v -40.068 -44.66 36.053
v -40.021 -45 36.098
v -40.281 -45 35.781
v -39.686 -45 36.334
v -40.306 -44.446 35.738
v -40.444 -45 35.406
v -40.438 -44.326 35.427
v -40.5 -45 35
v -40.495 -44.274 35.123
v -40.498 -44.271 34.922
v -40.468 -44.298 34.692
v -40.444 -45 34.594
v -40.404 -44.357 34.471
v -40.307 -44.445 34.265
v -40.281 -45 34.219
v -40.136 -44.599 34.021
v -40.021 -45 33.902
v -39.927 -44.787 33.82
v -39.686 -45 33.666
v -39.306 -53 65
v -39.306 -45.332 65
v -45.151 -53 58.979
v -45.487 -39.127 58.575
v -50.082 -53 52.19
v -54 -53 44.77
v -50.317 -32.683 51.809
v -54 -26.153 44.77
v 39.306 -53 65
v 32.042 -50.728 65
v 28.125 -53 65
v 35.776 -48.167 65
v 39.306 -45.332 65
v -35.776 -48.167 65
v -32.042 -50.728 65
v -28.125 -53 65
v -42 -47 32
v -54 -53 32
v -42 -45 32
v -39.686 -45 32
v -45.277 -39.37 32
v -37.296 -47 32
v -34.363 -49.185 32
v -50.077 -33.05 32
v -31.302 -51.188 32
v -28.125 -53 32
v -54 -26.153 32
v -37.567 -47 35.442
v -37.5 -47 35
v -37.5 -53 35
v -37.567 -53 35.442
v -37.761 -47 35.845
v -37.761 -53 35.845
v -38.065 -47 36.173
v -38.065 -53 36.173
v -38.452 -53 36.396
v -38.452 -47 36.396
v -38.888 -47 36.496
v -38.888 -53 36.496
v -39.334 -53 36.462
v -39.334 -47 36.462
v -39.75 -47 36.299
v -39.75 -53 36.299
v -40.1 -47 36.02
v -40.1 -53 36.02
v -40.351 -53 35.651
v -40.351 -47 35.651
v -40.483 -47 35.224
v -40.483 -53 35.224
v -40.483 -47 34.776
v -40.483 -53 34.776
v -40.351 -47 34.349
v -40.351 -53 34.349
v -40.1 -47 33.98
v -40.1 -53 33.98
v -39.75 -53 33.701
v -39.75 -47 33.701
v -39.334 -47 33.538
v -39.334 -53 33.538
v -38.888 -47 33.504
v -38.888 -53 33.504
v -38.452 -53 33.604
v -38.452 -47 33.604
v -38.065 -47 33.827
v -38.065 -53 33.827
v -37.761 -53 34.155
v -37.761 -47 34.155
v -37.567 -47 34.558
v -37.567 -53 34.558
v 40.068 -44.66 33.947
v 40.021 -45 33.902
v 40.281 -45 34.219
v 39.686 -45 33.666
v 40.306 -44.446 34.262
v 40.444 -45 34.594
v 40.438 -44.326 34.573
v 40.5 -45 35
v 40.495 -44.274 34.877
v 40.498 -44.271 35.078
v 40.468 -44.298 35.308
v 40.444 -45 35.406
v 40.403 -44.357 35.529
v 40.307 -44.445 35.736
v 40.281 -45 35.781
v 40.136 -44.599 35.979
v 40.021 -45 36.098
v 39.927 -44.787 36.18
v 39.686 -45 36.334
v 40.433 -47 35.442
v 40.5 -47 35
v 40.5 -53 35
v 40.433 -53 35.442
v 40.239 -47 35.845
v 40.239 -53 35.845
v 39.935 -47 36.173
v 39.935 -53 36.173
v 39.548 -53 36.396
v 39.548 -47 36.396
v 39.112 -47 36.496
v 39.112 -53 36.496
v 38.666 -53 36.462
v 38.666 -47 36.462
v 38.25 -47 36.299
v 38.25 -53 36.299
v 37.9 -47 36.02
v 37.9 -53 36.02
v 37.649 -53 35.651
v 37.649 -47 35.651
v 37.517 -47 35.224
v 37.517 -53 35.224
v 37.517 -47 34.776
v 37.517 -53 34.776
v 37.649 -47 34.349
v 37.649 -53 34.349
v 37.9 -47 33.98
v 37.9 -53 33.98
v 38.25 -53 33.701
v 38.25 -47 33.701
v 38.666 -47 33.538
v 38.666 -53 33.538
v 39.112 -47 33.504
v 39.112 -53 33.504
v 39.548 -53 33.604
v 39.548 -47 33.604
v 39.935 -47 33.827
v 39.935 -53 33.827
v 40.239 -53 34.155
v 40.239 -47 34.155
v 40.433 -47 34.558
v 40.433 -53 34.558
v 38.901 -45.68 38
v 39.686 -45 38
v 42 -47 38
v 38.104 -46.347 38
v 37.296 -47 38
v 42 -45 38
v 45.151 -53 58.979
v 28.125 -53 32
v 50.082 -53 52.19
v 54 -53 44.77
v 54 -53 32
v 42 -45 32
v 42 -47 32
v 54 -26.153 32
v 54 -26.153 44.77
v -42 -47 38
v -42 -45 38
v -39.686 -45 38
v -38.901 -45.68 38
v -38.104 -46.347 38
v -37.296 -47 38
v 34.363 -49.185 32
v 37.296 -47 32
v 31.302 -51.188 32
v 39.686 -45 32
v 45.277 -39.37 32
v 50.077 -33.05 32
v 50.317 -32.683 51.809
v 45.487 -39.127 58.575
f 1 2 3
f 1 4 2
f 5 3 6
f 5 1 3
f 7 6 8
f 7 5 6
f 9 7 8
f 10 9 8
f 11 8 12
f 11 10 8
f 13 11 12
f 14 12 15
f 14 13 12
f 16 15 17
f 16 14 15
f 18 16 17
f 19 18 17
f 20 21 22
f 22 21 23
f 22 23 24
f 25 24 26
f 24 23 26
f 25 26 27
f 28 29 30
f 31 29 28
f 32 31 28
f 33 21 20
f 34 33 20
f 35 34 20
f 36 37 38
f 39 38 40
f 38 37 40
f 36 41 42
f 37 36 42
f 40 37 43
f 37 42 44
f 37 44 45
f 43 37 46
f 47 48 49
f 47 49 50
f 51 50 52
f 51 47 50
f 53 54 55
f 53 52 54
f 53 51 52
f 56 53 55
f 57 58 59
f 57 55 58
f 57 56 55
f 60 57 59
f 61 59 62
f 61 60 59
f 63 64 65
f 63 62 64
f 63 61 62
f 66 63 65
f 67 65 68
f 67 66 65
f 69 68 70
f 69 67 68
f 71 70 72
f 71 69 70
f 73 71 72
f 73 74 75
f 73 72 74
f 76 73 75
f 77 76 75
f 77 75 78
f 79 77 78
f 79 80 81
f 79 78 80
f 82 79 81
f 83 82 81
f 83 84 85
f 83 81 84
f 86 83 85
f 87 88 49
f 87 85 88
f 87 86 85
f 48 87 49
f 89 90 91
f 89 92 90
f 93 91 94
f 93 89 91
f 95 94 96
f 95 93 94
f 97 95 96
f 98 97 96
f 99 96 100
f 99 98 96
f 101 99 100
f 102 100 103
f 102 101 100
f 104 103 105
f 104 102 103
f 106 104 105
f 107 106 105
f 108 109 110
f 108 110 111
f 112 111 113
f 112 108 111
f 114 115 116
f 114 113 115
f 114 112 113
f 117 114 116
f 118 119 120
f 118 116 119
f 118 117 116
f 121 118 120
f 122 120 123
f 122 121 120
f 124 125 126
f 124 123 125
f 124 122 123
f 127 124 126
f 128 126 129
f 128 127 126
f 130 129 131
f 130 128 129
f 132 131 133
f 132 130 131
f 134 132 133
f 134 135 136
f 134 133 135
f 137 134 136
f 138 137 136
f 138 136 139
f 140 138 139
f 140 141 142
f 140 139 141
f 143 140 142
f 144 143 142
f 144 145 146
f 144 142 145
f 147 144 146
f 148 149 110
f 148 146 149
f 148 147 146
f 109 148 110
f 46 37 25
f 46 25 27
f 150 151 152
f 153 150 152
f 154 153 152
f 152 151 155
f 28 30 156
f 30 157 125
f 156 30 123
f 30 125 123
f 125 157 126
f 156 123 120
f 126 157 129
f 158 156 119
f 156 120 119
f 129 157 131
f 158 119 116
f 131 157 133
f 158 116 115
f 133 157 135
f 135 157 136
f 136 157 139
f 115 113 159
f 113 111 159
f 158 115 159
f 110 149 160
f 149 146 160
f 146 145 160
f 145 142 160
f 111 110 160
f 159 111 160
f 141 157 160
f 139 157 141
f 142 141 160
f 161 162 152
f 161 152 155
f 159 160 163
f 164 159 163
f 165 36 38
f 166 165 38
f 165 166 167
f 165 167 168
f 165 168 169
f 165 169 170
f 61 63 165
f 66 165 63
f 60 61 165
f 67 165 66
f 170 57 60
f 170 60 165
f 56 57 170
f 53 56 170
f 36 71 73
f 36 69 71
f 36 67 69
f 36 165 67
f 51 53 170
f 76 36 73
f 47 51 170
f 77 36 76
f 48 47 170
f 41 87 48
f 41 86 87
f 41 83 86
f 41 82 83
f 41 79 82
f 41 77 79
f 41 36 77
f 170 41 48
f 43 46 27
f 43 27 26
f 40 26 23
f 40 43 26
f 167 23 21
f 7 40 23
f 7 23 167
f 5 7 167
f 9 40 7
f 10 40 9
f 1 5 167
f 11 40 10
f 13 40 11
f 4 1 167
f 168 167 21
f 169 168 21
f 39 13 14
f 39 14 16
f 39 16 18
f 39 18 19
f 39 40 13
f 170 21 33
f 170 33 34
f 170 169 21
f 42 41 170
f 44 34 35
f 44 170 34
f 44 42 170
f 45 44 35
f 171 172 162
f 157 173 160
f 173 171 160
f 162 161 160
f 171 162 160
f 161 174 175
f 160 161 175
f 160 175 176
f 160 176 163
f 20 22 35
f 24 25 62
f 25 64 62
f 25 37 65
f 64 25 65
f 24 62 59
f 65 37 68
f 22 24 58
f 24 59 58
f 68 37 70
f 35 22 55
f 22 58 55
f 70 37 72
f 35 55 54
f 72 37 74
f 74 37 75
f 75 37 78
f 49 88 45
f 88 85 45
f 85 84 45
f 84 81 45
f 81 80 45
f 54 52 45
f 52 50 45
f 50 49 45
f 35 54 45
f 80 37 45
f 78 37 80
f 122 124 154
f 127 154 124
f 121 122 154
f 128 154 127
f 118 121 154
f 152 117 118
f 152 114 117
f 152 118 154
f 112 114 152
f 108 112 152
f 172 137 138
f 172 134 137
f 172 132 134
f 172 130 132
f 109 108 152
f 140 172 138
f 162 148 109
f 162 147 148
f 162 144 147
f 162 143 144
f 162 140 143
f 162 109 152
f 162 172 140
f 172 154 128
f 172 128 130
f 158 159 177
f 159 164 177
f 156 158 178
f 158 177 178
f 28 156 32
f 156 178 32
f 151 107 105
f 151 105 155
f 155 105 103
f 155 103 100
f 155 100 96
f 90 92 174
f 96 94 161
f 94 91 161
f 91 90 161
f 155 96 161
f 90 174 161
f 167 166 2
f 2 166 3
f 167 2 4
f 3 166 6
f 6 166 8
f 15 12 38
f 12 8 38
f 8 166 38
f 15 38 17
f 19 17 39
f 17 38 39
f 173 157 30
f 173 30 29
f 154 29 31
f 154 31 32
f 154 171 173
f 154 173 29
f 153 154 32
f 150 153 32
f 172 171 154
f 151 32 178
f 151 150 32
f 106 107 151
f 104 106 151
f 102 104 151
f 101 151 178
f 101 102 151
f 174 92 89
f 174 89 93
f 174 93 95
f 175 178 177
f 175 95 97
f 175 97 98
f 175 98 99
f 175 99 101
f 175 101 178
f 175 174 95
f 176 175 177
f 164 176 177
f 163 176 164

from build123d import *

# Parameters (mm, degrees)
CYLINDER1296_R     = 59
CYLINDER1296_DEPTH = 40
BOX454_W           = 6
BOX454_H           = 2
BOX454_DEPTH       = 6
BOX453_W           = 6
BOX453_H           = 2
BOX453_DEPTH       = 6
CYLINDER212_R      = 1.5
CYLINDER212_DEPTH  = 20
CYLINDER211_R      = 1.5
CYLINDER211_DEPTH  = 20
CYLINDER1295_R     = 60
CYLINDER1295_DEPTH = 33
BOX463_W           = 108
BOX463_H           = 46
BOX463_DEPTH       = 33


with BuildPart() as v_lec1296:
    # Cylinder1296 → Cylinder1296 (new body)
    with BuildSketch(Plane(origin=(0, -17, 21), x_dir=(1, 0, 0), z_dir=(0, -1, 0))):
        Circle(CYLINDER1296_R)
    extrude(amount=CYLINDER1296_DEPTH)


with BuildPart() as krychle454:
    # Box454 → Box454 (new body)
    with BuildSketch(Plane(origin=(-42, -45, 31), x_dir=(1, 0, 0), z_dir=(0, 0, 1))):
        with Locations((3, 1)):
            Rectangle(BOX454_W, BOX454_H)
    extrude(amount=BOX454_DEPTH)


with BuildPart() as compound840:
    # Box453 → Box453 (new body)
    with BuildSketch(Plane(origin=(36, -45, 31), x_dir=(1, 0, 0), z_dir=(0, 0, 1))):
        with Locations((3, 1)):
            Rectangle(BOX453_W, BOX453_H)
    extrude(amount=BOX453_DEPTH)

    # Compound840: union Krychle454
    add(krychle454.part)


with BuildPart() as compound840_1:
    # Compound840 placement: moved
    add(compound840.part.moved(Location((0, -2, -11))))


with BuildPart() as v_lec212:
    # Cylinder212 → Cylinder212 (new body)
    with BuildSketch(Plane(origin=(39, -40, 34), x_dir=(1, 0, 0), z_dir=(0, -1, 0))):
        Circle(CYLINDER212_R)
    extrude(amount=CYLINDER212_DEPTH)


with BuildPart() as compound836:
    # Cylinder211 → Cylinder211 (new body)
    with BuildSketch(Plane(origin=(-39, -40, 34), x_dir=(1, 0, 0), z_dir=(0, -1, 0))):
        Circle(CYLINDER211_R)
    extrude(amount=CYLINDER211_DEPTH)

    # Compound836: union Válec212
    add(v_lec212.part)


with BuildPart() as compound836_1:
    # Compound836 placement: moved
    add(compound836.part.moved(Location((0, 0, -11))))


with BuildPart() as v_lec1295:
    # Cylinder1295 → Cylinder1295 (new body)
    with BuildSketch(Plane.XY.offset(20)):
        Circle(CYLINDER1295_R)
    extrude(amount=CYLINDER1295_DEPTH)


with BuildPart() as common001:
    # Box463 → Box463 (new body)
    with BuildSketch(Plane(origin=(-54, -53, 20), x_dir=(1, 0, 0), z_dir=(0, 0, 1))):
        with Locations((54, 23)):
            Rectangle(BOX463_W, BOX463_H)
    extrude(amount=BOX463_DEPTH)

    # Cut447: cut Válec1295
    add(v_lec1295.part, mode=Mode.SUBTRACT)

    # Cut454: cut Compound836
    add(compound836_1.part, mode=Mode.SUBTRACT)

    # Cut443: cut Compound840
    add(compound840_1.part, mode=Mode.SUBTRACT)


with BuildPart() as common001_1:
    # Cut443 placement: moved
    add(common001.part.moved(Location((0, 0, 12))))

    # Common001: intersect Válec1296
    add(v_lec1296.part, mode=Mode.INTERSECT)


solid = common001_1.part
